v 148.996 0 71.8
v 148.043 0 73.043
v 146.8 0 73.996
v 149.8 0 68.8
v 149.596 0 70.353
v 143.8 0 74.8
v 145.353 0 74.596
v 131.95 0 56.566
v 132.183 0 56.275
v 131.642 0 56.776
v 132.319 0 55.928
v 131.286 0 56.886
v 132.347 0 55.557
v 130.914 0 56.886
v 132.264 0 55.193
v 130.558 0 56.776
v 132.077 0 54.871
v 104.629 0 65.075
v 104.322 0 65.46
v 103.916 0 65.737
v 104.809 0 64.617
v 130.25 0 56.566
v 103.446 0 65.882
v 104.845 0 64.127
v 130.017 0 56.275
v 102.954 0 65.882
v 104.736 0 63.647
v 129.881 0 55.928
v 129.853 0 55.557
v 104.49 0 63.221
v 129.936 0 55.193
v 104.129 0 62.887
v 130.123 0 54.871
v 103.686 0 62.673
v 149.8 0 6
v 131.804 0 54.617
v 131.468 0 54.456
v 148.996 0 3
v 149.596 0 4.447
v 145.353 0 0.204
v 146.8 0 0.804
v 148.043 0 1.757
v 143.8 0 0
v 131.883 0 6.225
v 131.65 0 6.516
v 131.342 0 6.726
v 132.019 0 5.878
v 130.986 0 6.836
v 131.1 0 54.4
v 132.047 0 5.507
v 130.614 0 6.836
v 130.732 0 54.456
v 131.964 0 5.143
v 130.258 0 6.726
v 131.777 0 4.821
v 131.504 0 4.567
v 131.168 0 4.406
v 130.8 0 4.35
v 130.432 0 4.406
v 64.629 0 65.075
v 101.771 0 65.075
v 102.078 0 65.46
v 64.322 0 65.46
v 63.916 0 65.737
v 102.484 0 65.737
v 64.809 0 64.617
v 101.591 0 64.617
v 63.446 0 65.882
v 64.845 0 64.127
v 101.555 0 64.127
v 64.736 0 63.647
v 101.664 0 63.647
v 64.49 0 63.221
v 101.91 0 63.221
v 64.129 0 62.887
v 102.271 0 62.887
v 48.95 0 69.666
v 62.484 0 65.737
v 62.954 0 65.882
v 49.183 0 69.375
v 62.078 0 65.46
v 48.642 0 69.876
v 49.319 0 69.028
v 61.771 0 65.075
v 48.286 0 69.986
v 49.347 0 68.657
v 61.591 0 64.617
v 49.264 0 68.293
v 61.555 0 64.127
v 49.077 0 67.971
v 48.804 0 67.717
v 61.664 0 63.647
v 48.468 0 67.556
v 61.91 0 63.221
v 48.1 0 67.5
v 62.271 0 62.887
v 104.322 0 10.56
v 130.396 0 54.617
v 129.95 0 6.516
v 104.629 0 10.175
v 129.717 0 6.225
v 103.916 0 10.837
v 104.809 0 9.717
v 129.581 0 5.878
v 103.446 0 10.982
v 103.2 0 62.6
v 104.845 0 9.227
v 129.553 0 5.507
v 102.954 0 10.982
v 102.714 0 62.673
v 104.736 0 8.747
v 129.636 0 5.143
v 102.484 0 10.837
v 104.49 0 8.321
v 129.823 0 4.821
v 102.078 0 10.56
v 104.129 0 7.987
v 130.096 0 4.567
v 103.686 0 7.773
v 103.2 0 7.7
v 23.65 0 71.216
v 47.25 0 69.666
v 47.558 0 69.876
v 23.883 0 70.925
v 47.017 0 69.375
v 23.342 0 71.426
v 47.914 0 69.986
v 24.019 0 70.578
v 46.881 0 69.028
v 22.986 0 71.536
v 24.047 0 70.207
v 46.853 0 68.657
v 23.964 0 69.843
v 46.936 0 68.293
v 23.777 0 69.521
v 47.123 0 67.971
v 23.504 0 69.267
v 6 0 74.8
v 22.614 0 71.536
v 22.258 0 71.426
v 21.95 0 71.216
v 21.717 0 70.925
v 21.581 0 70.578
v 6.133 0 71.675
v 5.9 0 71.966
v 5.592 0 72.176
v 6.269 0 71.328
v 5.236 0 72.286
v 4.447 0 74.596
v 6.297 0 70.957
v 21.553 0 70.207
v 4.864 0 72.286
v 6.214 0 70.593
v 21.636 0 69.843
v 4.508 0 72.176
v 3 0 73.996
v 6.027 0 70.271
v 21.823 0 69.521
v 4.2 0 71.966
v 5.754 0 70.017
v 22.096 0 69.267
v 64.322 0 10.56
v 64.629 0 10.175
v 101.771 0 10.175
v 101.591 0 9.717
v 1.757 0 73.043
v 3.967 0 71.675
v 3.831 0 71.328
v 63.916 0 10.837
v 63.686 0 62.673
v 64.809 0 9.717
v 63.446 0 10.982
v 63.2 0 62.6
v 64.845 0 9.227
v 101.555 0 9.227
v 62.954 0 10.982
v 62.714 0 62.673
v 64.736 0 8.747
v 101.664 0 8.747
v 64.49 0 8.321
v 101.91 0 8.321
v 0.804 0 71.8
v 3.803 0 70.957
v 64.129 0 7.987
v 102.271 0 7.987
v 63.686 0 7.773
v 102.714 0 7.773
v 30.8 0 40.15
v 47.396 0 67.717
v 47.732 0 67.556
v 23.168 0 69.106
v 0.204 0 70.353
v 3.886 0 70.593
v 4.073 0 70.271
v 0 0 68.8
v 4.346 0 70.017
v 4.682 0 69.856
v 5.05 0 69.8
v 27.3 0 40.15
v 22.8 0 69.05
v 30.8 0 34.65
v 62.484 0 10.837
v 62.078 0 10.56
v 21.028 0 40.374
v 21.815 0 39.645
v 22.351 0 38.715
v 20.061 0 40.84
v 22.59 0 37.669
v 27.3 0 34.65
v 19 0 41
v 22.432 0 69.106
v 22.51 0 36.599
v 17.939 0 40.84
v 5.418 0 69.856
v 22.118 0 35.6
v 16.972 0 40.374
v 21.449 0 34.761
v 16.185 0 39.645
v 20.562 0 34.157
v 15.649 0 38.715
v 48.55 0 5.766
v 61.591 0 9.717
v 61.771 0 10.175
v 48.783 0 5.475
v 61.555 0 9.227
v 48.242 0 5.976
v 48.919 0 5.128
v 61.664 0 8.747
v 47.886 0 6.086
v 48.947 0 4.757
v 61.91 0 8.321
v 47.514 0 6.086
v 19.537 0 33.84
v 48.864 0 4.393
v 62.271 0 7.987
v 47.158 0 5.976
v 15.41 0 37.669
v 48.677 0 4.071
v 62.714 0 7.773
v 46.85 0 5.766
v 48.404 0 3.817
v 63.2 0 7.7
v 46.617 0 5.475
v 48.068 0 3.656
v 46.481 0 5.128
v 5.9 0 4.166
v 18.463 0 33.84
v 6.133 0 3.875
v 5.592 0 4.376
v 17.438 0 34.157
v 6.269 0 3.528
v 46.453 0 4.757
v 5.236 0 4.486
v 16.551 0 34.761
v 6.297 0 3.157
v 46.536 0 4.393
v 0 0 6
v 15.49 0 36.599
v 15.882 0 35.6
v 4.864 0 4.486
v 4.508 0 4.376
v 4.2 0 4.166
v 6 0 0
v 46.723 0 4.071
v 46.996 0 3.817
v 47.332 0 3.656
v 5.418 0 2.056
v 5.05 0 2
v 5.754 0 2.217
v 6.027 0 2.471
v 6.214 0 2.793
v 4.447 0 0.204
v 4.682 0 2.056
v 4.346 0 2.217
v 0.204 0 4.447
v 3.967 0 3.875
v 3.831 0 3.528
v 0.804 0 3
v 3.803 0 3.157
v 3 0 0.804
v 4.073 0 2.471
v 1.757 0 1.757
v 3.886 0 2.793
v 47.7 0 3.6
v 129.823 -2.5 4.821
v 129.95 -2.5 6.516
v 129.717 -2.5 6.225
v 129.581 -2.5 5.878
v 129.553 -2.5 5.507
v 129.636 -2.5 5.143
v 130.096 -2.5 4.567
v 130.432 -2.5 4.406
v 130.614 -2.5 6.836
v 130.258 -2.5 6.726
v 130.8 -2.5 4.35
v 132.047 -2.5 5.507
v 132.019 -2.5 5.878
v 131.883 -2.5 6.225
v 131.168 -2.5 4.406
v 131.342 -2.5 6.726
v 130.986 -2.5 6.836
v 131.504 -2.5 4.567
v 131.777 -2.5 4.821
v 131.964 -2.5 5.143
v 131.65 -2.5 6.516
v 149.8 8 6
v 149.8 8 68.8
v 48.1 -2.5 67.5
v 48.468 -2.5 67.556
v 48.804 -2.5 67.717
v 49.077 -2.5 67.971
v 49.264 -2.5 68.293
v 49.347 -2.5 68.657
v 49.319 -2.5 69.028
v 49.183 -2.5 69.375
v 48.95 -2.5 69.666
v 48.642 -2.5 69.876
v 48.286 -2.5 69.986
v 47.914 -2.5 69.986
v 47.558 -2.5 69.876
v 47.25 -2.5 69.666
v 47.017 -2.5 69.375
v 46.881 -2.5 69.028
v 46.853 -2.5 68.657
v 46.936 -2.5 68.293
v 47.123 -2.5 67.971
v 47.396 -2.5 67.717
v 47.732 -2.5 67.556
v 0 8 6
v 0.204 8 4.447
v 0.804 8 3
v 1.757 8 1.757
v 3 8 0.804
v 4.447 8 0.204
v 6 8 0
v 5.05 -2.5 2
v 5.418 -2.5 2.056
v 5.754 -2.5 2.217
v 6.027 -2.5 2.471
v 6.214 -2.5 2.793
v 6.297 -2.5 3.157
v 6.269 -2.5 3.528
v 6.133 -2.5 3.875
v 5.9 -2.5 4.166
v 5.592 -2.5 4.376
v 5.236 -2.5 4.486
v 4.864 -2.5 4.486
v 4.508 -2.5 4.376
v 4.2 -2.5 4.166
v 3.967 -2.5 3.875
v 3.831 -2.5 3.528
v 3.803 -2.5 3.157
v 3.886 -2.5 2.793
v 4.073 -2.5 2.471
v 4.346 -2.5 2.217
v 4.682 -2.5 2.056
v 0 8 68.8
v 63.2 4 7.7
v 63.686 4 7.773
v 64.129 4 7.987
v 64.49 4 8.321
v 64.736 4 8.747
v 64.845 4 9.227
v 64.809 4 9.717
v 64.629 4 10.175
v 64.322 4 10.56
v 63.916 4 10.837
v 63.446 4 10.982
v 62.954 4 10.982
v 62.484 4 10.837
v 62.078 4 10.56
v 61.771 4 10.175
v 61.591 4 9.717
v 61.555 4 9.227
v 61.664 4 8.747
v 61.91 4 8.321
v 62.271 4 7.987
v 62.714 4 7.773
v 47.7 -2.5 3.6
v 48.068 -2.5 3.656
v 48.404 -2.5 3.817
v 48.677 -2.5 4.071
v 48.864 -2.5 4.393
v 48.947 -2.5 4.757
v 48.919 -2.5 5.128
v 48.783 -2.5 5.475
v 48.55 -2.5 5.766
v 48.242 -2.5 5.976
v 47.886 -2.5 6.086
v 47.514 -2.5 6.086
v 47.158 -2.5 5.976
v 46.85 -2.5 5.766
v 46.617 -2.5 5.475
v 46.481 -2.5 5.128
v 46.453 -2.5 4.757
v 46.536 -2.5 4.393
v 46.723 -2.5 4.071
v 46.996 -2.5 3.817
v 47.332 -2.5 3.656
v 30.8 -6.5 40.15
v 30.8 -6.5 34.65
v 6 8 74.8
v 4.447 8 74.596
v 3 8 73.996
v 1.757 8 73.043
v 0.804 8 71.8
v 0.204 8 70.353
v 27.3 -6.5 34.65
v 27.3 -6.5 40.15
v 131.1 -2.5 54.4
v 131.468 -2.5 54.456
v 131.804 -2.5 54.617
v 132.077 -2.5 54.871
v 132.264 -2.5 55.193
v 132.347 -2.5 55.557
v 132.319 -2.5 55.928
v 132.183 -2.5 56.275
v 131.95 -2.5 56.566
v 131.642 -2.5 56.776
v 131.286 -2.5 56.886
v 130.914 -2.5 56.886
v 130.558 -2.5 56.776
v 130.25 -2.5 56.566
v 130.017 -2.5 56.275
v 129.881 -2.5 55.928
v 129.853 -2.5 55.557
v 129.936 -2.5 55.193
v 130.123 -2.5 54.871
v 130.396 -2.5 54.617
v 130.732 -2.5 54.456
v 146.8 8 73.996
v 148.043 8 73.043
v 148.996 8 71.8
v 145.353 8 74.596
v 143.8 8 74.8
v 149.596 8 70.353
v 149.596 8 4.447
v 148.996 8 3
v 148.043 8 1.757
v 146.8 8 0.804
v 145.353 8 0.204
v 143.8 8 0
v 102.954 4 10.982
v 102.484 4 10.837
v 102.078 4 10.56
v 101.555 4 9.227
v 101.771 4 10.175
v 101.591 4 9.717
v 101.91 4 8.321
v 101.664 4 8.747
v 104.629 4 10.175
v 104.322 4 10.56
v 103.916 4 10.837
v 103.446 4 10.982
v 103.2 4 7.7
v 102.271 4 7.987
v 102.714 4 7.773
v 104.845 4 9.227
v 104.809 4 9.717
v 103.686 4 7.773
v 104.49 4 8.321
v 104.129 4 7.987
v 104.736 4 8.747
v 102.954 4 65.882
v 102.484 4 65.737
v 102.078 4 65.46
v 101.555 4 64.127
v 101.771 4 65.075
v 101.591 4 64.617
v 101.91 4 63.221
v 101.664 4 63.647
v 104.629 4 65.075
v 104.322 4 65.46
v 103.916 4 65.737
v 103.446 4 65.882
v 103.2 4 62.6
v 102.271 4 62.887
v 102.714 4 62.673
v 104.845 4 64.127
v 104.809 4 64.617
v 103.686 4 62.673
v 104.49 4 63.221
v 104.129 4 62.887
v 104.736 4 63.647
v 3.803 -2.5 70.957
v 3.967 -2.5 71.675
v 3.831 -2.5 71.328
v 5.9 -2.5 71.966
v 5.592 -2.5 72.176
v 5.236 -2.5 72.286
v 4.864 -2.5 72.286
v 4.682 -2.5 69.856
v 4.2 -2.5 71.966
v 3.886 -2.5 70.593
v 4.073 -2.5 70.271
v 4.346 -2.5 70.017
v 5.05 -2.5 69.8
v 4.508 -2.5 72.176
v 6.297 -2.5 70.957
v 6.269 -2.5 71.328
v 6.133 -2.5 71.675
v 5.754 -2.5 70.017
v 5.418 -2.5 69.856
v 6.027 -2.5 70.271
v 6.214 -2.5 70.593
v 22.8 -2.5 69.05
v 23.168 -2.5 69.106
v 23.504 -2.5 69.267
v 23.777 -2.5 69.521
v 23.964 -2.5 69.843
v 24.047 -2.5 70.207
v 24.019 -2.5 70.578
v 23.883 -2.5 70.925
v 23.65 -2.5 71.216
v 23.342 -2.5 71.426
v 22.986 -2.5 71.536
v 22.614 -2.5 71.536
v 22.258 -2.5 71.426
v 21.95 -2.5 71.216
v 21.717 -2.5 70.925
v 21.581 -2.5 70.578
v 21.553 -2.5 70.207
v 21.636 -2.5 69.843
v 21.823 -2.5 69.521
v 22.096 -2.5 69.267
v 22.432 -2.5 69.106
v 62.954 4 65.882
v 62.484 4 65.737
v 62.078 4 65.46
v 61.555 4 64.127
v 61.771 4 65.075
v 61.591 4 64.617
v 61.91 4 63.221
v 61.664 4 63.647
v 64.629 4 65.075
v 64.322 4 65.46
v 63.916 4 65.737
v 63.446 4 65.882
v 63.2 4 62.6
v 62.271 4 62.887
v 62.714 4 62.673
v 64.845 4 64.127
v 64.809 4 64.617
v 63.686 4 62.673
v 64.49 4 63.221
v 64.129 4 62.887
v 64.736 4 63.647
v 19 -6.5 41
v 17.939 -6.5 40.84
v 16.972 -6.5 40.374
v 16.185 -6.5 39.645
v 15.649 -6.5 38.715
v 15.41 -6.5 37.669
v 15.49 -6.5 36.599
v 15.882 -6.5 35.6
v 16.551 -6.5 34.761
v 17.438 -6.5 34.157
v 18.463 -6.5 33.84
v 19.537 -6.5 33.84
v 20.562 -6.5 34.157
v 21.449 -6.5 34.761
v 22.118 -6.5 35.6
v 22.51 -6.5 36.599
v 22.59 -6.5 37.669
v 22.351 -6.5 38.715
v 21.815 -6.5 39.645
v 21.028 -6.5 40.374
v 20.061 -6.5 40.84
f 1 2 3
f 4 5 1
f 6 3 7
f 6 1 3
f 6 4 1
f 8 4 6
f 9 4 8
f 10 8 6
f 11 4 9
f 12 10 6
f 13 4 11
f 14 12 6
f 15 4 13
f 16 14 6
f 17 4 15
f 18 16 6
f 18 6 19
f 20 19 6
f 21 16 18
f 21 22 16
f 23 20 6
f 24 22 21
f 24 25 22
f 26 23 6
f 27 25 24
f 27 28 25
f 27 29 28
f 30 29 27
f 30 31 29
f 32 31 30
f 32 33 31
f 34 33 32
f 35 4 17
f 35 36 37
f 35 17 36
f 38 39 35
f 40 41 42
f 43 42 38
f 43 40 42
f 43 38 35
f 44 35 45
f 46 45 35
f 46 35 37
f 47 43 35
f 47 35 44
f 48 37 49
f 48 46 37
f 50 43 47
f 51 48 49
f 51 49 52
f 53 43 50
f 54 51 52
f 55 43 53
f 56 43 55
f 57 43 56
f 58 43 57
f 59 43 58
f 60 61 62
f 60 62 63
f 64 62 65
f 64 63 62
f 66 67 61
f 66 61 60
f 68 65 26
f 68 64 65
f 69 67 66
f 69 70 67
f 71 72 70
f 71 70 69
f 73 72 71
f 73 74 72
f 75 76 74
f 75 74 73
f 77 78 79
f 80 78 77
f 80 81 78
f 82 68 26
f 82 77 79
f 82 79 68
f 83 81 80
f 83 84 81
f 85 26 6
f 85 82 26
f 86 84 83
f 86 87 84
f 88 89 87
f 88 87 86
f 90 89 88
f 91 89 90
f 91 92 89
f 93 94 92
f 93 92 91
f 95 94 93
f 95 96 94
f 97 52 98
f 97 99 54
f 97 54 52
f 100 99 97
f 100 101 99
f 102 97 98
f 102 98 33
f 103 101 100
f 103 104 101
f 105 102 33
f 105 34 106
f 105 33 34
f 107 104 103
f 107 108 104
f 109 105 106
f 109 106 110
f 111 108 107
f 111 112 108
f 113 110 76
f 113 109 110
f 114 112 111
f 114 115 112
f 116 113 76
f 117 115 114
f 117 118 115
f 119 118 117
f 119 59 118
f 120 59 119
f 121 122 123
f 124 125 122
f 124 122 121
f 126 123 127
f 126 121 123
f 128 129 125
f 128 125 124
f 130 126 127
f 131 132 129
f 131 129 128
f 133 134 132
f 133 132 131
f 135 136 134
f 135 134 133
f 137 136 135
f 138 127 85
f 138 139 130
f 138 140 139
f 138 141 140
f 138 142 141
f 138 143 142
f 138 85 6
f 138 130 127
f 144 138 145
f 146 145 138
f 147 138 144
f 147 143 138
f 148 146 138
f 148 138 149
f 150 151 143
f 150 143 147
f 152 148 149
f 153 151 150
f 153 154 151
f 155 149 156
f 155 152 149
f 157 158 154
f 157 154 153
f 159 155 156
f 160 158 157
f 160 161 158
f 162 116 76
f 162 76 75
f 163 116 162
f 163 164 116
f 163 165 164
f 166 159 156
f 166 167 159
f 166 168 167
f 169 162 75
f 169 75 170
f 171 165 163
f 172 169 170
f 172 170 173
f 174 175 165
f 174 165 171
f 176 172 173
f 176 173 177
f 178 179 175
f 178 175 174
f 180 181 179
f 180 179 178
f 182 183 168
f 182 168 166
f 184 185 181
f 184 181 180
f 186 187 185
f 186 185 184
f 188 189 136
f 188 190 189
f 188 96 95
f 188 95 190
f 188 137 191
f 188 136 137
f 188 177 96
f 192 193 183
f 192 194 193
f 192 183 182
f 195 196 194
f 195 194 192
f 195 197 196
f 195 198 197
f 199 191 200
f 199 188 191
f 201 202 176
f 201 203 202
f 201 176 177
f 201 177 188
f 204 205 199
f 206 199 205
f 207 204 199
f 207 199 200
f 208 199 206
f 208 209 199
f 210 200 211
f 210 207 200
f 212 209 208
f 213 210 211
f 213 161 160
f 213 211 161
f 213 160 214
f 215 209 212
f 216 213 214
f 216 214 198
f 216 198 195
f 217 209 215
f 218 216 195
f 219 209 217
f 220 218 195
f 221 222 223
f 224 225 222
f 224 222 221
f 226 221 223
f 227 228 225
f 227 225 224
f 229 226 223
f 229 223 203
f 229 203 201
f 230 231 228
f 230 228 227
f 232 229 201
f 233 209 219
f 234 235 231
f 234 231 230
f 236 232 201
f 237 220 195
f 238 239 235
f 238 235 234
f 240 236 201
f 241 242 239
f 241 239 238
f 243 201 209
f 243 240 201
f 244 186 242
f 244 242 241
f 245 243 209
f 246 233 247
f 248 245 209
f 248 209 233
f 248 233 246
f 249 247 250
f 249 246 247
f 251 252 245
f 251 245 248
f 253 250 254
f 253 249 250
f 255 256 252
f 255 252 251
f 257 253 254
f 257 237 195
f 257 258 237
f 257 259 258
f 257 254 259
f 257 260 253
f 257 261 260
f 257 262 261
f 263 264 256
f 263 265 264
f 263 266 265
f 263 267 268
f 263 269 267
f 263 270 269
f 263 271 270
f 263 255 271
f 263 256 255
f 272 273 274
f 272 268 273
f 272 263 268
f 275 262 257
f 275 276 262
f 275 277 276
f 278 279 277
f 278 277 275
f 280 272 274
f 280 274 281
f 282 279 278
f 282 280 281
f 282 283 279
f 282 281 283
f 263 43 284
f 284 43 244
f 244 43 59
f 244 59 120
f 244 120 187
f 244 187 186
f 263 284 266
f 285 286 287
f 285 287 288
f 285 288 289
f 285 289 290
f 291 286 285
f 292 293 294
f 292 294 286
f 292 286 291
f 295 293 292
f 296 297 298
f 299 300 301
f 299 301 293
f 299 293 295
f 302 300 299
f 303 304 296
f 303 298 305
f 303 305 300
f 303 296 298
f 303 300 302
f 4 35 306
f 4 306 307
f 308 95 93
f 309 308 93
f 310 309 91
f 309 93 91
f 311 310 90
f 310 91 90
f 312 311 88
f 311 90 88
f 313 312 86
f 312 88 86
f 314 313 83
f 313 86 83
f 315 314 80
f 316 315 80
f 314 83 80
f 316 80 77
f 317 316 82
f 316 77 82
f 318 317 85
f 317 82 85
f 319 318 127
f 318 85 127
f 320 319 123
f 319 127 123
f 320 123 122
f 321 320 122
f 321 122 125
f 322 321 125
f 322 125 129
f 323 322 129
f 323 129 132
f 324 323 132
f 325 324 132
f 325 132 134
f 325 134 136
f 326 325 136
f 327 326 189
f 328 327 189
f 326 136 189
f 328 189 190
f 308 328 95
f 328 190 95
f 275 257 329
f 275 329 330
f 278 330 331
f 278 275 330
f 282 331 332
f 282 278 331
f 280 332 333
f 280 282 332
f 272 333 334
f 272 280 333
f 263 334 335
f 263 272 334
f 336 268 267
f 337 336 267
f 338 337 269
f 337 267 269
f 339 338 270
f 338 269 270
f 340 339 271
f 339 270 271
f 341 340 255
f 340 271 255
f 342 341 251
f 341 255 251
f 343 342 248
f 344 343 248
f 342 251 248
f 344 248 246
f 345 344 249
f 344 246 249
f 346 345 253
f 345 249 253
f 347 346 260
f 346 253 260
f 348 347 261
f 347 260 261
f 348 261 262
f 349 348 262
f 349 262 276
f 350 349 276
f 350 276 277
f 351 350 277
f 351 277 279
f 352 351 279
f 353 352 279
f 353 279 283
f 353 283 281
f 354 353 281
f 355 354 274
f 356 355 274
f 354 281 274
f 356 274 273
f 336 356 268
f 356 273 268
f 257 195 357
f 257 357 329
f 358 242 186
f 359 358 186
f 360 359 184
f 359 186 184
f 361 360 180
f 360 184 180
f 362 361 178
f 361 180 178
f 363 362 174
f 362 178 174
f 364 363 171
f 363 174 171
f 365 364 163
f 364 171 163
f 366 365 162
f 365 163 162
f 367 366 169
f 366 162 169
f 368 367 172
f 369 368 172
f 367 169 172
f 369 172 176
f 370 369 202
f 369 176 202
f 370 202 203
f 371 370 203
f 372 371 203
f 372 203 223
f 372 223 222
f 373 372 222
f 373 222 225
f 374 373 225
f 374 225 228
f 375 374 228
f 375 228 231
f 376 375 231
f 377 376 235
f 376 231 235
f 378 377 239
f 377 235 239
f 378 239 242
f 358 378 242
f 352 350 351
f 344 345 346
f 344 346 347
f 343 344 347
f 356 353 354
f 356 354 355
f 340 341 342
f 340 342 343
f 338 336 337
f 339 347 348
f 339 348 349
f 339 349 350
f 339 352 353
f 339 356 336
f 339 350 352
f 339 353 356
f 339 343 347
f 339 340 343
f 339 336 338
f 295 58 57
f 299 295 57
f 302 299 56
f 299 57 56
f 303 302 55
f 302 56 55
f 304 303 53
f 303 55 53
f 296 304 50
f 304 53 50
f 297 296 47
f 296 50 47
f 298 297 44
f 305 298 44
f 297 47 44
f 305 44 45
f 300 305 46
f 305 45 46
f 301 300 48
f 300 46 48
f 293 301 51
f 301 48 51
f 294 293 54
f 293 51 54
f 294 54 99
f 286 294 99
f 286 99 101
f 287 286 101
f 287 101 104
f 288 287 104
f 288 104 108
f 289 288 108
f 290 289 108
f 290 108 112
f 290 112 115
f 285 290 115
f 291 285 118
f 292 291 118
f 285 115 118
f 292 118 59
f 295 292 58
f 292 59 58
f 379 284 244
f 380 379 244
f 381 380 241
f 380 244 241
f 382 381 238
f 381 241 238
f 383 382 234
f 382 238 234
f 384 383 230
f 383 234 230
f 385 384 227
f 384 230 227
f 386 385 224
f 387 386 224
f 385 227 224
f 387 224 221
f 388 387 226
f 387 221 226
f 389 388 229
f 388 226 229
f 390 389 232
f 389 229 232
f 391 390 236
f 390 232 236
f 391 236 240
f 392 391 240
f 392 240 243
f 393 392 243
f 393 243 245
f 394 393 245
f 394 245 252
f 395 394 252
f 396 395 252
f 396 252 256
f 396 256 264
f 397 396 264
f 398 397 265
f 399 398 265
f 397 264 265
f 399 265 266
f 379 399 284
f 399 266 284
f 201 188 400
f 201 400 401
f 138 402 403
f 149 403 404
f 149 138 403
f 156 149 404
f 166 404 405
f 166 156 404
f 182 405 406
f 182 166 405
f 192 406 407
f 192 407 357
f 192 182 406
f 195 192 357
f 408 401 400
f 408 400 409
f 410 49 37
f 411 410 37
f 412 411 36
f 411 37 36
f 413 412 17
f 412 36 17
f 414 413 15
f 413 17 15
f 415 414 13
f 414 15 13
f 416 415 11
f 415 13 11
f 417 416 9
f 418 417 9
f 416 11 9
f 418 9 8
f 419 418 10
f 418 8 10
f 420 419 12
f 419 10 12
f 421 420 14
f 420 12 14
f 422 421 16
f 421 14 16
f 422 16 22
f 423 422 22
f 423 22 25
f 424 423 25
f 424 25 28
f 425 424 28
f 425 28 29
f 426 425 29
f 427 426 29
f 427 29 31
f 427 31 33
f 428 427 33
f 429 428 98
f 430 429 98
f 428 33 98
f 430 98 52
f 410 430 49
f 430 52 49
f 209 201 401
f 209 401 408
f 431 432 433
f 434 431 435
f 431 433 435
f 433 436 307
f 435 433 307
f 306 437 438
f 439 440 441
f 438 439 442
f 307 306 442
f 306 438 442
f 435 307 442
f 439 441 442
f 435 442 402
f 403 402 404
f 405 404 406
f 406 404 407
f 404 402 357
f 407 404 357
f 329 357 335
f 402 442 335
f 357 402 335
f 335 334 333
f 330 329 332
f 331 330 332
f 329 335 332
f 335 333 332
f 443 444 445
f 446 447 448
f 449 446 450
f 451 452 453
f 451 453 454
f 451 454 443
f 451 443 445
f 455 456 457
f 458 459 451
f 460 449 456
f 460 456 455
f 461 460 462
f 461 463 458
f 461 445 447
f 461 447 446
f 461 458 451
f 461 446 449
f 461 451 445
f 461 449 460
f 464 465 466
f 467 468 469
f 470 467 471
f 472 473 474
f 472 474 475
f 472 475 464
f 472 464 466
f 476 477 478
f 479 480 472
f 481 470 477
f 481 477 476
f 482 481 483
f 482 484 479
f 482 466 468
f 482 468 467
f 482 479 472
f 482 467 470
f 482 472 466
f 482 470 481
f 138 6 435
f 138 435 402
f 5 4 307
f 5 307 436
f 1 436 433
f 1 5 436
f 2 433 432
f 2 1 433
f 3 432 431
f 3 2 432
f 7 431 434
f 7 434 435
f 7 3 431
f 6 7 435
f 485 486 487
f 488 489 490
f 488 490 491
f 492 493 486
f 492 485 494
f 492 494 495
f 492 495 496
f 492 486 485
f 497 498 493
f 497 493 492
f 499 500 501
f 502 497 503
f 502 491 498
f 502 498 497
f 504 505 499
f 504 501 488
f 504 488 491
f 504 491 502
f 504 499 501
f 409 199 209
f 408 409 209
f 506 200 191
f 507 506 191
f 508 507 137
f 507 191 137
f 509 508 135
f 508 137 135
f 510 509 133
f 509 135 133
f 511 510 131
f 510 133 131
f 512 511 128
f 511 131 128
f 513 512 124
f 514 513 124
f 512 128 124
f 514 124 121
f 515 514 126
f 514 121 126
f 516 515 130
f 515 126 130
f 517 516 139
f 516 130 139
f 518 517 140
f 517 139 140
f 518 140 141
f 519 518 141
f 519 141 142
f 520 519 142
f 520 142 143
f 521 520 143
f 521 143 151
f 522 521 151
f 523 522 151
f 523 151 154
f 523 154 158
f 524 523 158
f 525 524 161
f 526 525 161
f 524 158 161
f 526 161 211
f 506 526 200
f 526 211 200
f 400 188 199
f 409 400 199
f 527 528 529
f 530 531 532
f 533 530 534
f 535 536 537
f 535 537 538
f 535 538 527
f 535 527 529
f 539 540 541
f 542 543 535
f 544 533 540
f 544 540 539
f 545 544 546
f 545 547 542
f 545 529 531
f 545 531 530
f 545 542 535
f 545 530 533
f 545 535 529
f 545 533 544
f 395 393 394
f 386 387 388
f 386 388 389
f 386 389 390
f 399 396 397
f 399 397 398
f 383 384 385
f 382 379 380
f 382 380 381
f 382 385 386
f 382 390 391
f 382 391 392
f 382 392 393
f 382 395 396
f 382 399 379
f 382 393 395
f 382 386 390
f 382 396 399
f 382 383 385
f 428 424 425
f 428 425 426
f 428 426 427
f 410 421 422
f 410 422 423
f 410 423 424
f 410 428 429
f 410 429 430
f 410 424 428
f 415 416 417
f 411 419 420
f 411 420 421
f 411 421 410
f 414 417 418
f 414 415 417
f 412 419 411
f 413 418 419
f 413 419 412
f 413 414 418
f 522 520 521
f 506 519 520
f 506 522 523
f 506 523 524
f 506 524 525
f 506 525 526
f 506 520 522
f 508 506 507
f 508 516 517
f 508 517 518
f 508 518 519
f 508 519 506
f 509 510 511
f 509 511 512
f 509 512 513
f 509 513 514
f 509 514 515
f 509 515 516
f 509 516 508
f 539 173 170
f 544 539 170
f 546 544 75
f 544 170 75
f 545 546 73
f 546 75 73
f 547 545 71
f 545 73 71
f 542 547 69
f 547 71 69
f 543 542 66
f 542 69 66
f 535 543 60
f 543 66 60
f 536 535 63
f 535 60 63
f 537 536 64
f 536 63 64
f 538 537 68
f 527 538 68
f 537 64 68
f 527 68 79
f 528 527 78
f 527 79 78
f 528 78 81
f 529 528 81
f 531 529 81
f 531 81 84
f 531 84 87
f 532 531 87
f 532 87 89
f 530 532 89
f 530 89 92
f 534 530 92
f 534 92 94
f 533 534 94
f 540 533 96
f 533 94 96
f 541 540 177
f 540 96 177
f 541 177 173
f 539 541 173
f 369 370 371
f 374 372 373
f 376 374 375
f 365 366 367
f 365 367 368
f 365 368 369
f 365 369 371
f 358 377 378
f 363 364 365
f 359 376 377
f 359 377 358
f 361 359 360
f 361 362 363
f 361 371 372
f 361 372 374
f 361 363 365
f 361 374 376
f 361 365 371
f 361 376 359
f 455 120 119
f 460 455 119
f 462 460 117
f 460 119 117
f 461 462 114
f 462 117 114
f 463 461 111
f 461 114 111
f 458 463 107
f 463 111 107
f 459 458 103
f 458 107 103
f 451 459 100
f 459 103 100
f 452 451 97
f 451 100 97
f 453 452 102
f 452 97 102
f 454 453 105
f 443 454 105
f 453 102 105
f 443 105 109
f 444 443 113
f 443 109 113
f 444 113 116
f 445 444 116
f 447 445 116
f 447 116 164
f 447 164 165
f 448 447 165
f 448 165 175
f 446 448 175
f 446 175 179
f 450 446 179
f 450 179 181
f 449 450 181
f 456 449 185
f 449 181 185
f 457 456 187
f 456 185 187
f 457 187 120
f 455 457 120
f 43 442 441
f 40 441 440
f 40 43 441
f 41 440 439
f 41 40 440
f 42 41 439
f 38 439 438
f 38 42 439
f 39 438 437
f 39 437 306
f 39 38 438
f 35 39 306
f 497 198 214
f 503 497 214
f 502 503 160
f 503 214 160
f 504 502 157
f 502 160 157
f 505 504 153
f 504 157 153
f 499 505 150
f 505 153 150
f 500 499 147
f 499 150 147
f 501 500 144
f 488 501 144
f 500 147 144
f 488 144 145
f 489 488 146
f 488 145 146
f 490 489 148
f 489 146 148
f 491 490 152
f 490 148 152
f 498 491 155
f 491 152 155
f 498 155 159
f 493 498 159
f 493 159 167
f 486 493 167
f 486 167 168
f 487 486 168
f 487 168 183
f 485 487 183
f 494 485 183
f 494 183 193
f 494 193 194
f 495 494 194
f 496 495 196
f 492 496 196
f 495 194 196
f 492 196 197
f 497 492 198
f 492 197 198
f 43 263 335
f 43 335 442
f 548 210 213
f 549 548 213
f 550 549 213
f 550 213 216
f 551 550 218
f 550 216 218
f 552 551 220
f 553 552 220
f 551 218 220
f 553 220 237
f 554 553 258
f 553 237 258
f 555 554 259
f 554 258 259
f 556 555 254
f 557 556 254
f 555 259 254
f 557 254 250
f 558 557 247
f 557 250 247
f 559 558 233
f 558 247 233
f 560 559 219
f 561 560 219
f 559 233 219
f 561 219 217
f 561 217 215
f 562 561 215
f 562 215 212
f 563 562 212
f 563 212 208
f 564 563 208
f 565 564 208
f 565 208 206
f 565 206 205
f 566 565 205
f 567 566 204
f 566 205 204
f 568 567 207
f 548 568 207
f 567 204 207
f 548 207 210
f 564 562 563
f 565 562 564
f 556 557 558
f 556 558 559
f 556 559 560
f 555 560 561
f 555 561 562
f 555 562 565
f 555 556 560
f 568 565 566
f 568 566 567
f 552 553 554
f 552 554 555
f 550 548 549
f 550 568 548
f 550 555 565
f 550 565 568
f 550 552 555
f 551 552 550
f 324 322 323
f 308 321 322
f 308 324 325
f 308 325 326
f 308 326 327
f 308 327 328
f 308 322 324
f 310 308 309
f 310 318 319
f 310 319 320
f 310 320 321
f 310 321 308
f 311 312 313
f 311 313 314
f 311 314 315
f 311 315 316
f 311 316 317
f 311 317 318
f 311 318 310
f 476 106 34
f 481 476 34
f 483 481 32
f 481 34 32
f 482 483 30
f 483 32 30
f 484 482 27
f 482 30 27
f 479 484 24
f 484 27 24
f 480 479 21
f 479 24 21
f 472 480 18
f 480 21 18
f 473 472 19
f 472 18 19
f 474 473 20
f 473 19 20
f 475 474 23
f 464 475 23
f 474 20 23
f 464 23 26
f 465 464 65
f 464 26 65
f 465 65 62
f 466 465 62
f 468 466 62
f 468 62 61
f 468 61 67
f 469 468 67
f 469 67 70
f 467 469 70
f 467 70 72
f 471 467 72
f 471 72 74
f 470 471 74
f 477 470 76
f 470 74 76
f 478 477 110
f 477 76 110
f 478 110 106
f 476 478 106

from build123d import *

# Parameters (mm, degrees)
EXTRUDE_1_DEPTH     = 8
SKETCH_2_6_R        = 1.25
EXTRUDE_6_DEPTH     = 2.5
SKETCH_2_7_R        = 1.65
CUT_EXTRUDE_1_DEPTH = 4
SKETCH_2_R          = 3.6
SKETCH_2_W          = 3.5
SKETCH_2_H          = 5.5
EXTRUDE_7_DEPTH     = 6.5


with BuildPart() as part:
    # 草图1 → 凸台-拉伸1 (new body)
    with BuildSketch(Plane(origin=(0, 0, 0), x_dir=(1, 0, 0), z_dir=(0, 1, 0))):
        with BuildLine():
            Line((6, 0), (143.8, 0))
            ThreePointArc((143.8, 0), (148.042640687, -1.757359313), (149.8, -6))
            Line((149.8, -6), (149.8, -68.8))
            ThreePointArc((149.8, -68.8), (148.042640687, -73.042640687), (143.8, -74.8))
            Line((143.8, -74.8), (6, -74.8))
            ThreePointArc((6, -74.8), (1.757359313, -73.042640687), (0, -68.8))
            Line((0, -68.8), (0, -6))
            ThreePointArc((0, -6), (1.757359313, -1.757359313), (6, 0))
        make_face()
    extrude(amount=EXTRUDE_1_DEPTH)

    # 草图2<6> → 凸台-拉伸6 (add)
    with BuildSketch(Plane(origin=(0, 0, 0), x_dir=(-1, 0, 0), z_dir=(0, -1, 0))):
        with Locations((-130.8, -5.6)):
            Circle(SKETCH_2_6_R)
        with Locations((-131.1, -55.65)):
            Circle(SKETCH_2_6_R)
        with Locations((-47.7, -4.85)):
            Circle(SKETCH_2_6_R)
        with Locations((-48.1, -68.75)):
            Circle(SKETCH_2_6_R)
        with Locations((-22.8, -70.3)):
            Circle(SKETCH_2_6_R)
        with Locations((-5.05, -71.05)):
            Circle(SKETCH_2_6_R)
        with Locations((-5.05, -3.25)):
            Circle(SKETCH_2_6_R)
    extrude(amount=EXTRUDE_6_DEPTH)

    # 草图2<7> → 切除-拉伸1 (cut)
    with BuildSketch(Plane(origin=(0, 0, 0), x_dir=(-1, 0, 0), z_dir=(0, -1, 0))):
        with Locations((-103.2, -9.35)):
            Circle(SKETCH_2_7_R)
        with Locations((-103.2, -64.25)):
            Circle(SKETCH_2_7_R)
        with Locations((-63.2, -64.25)):
            Circle(SKETCH_2_7_R)
        with Locations((-63.2, -9.35)):
            Circle(SKETCH_2_7_R)
    extrude(amount=-CUT_EXTRUDE_1_DEPTH, mode=Mode.SUBTRACT)

    # 草图2 → 凸台-拉伸7 (add)
    with BuildSketch(Plane(origin=(0, 0, 0), x_dir=(-1, 0, 0), z_dir=(0, -1, 0))):
        with Locations((-19, -37.4)):
            Circle(SKETCH_2_R)
        with Locations((-29.05, -37.4)):
            Rectangle(SKETCH_2_W, SKETCH_2_H)
    extrude(amount=EXTRUDE_7_DEPTH)


solid = part.part
